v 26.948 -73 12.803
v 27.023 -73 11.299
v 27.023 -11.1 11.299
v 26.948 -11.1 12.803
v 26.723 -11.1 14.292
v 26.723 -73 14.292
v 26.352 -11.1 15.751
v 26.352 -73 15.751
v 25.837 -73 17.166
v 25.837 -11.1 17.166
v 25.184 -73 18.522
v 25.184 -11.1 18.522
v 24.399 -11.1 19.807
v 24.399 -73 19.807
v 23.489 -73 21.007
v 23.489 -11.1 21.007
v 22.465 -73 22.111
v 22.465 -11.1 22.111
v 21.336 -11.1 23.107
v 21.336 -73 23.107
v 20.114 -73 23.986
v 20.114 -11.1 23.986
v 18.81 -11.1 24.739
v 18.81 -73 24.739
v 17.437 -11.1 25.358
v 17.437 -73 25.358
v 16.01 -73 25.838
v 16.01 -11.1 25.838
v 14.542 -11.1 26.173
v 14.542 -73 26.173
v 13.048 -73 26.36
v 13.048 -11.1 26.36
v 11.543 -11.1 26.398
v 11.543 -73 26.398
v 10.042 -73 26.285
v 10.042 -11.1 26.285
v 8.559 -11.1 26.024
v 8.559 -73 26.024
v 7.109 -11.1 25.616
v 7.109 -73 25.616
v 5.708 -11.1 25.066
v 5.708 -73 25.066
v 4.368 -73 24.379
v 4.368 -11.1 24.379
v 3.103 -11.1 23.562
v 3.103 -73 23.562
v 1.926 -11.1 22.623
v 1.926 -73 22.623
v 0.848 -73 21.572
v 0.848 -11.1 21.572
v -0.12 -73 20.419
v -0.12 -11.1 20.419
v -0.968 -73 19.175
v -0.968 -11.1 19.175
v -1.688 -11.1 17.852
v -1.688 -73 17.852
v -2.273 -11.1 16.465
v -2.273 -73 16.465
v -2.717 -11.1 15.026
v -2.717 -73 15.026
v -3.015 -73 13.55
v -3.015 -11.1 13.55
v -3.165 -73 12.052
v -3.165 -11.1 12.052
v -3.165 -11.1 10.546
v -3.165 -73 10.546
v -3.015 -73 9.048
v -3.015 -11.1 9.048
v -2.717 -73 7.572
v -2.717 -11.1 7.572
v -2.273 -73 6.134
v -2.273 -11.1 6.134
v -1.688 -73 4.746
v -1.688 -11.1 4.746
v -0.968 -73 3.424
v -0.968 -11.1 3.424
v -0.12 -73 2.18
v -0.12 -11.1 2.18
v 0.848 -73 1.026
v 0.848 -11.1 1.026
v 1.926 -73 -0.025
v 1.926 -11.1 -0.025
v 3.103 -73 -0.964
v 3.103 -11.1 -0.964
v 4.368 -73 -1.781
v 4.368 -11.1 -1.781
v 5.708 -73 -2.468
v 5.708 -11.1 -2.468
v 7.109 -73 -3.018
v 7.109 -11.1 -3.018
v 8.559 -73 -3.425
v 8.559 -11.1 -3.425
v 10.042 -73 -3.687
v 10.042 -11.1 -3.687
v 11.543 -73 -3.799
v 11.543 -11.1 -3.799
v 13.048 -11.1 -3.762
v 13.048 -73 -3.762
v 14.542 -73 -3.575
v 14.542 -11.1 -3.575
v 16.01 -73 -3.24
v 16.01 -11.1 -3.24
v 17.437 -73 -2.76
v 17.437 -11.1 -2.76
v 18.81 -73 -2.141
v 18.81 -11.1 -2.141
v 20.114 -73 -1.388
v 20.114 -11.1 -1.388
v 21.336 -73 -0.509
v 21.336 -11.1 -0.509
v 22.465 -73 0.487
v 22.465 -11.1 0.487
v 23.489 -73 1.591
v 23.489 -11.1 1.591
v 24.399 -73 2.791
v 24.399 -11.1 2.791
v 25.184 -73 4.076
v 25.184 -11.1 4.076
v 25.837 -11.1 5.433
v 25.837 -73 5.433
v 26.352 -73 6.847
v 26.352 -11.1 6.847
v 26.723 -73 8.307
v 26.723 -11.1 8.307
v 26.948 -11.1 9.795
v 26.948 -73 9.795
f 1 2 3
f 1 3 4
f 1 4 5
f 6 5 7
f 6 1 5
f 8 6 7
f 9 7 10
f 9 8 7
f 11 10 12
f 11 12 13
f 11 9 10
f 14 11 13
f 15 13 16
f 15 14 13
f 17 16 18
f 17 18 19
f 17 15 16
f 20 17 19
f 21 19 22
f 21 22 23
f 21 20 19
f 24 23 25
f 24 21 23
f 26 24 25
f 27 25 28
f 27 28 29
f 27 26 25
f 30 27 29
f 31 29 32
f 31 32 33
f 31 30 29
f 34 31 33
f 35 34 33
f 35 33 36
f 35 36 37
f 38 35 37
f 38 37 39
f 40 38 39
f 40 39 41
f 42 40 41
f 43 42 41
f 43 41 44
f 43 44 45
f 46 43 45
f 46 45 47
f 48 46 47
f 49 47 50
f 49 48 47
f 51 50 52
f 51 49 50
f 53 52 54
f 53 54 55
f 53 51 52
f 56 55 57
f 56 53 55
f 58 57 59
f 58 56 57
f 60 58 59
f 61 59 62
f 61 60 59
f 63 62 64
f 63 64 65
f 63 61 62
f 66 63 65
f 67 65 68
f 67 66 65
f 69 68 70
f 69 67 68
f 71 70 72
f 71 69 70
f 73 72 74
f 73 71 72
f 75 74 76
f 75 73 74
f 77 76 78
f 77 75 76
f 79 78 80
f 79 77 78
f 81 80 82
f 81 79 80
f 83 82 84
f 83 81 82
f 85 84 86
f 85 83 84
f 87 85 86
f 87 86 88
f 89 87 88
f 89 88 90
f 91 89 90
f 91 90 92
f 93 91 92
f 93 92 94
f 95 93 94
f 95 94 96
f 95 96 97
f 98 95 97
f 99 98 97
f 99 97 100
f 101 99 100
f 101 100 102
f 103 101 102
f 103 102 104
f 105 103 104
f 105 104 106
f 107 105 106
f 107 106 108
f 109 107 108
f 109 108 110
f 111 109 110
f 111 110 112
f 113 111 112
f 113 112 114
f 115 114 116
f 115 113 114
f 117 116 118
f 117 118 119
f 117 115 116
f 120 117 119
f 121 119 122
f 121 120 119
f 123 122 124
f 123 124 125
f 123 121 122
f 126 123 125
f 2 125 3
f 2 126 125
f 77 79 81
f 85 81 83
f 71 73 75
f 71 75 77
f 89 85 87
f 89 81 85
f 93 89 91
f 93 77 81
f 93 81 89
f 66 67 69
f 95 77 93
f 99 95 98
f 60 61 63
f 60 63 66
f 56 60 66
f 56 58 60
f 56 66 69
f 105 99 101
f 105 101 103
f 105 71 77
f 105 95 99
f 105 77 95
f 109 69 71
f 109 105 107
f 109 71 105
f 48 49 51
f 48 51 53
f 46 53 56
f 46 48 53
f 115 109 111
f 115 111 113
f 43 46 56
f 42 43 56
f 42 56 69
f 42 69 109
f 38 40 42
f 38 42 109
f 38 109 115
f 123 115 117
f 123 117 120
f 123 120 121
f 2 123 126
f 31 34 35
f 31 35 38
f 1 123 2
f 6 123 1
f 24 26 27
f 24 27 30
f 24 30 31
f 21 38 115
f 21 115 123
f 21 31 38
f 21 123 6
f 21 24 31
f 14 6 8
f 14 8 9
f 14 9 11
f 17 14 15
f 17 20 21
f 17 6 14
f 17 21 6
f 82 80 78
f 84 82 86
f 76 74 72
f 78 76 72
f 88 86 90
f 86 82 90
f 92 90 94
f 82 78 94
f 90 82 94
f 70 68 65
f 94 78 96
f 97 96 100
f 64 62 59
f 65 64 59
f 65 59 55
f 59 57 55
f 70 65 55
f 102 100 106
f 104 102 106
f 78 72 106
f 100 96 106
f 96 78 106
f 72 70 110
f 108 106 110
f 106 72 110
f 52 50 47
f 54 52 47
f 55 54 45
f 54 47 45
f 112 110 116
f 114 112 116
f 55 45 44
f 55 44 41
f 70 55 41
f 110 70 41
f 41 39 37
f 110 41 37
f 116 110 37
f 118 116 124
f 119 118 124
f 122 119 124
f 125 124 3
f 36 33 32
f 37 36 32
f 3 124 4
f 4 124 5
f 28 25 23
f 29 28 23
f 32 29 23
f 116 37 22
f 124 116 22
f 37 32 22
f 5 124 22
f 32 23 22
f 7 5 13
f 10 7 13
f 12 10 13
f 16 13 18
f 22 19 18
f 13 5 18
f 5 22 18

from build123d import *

# Parameters (mm, degrees)
F0_R     = 16.979872
F1_DEPTH = 73
F2_R     = 27.197587
F3_R     = 15.103287
F4_DEPTH = 61.9


with BuildPart() as f1:
    # F0 (on Front) → F1 (new body)
    with BuildSketch(Plane.XZ):
        Polygon((27.902432, 53.963579), (-62.461782, 53.963579), (-43.482464, -46.598472), (49.431205, -19.404227), (30.168617, 24.503149), align=None)
        with Locations((-25.352968, 16.004948)):
            Circle(F0_R, mode=Mode.SUBTRACT)
    extrude(amount=F1_DEPTH)

    # F2
    f2_edges = [f1.edges().sort_by_distance(p)[0] for p in [
        (49.431205, -36.5, -19.404227),
    ]]
    fillet(f2_edges, radius=F2_R)

    # F3 (on face) → F4 (intersect)
    with BuildSketch(Plane.XZ.offset(73)):
        with Locations((11.919588, 11.299165)):
            Circle(F3_R)
    extrude(amount=-F4_DEPTH, mode=Mode.INTERSECT)


solid = f1.part
